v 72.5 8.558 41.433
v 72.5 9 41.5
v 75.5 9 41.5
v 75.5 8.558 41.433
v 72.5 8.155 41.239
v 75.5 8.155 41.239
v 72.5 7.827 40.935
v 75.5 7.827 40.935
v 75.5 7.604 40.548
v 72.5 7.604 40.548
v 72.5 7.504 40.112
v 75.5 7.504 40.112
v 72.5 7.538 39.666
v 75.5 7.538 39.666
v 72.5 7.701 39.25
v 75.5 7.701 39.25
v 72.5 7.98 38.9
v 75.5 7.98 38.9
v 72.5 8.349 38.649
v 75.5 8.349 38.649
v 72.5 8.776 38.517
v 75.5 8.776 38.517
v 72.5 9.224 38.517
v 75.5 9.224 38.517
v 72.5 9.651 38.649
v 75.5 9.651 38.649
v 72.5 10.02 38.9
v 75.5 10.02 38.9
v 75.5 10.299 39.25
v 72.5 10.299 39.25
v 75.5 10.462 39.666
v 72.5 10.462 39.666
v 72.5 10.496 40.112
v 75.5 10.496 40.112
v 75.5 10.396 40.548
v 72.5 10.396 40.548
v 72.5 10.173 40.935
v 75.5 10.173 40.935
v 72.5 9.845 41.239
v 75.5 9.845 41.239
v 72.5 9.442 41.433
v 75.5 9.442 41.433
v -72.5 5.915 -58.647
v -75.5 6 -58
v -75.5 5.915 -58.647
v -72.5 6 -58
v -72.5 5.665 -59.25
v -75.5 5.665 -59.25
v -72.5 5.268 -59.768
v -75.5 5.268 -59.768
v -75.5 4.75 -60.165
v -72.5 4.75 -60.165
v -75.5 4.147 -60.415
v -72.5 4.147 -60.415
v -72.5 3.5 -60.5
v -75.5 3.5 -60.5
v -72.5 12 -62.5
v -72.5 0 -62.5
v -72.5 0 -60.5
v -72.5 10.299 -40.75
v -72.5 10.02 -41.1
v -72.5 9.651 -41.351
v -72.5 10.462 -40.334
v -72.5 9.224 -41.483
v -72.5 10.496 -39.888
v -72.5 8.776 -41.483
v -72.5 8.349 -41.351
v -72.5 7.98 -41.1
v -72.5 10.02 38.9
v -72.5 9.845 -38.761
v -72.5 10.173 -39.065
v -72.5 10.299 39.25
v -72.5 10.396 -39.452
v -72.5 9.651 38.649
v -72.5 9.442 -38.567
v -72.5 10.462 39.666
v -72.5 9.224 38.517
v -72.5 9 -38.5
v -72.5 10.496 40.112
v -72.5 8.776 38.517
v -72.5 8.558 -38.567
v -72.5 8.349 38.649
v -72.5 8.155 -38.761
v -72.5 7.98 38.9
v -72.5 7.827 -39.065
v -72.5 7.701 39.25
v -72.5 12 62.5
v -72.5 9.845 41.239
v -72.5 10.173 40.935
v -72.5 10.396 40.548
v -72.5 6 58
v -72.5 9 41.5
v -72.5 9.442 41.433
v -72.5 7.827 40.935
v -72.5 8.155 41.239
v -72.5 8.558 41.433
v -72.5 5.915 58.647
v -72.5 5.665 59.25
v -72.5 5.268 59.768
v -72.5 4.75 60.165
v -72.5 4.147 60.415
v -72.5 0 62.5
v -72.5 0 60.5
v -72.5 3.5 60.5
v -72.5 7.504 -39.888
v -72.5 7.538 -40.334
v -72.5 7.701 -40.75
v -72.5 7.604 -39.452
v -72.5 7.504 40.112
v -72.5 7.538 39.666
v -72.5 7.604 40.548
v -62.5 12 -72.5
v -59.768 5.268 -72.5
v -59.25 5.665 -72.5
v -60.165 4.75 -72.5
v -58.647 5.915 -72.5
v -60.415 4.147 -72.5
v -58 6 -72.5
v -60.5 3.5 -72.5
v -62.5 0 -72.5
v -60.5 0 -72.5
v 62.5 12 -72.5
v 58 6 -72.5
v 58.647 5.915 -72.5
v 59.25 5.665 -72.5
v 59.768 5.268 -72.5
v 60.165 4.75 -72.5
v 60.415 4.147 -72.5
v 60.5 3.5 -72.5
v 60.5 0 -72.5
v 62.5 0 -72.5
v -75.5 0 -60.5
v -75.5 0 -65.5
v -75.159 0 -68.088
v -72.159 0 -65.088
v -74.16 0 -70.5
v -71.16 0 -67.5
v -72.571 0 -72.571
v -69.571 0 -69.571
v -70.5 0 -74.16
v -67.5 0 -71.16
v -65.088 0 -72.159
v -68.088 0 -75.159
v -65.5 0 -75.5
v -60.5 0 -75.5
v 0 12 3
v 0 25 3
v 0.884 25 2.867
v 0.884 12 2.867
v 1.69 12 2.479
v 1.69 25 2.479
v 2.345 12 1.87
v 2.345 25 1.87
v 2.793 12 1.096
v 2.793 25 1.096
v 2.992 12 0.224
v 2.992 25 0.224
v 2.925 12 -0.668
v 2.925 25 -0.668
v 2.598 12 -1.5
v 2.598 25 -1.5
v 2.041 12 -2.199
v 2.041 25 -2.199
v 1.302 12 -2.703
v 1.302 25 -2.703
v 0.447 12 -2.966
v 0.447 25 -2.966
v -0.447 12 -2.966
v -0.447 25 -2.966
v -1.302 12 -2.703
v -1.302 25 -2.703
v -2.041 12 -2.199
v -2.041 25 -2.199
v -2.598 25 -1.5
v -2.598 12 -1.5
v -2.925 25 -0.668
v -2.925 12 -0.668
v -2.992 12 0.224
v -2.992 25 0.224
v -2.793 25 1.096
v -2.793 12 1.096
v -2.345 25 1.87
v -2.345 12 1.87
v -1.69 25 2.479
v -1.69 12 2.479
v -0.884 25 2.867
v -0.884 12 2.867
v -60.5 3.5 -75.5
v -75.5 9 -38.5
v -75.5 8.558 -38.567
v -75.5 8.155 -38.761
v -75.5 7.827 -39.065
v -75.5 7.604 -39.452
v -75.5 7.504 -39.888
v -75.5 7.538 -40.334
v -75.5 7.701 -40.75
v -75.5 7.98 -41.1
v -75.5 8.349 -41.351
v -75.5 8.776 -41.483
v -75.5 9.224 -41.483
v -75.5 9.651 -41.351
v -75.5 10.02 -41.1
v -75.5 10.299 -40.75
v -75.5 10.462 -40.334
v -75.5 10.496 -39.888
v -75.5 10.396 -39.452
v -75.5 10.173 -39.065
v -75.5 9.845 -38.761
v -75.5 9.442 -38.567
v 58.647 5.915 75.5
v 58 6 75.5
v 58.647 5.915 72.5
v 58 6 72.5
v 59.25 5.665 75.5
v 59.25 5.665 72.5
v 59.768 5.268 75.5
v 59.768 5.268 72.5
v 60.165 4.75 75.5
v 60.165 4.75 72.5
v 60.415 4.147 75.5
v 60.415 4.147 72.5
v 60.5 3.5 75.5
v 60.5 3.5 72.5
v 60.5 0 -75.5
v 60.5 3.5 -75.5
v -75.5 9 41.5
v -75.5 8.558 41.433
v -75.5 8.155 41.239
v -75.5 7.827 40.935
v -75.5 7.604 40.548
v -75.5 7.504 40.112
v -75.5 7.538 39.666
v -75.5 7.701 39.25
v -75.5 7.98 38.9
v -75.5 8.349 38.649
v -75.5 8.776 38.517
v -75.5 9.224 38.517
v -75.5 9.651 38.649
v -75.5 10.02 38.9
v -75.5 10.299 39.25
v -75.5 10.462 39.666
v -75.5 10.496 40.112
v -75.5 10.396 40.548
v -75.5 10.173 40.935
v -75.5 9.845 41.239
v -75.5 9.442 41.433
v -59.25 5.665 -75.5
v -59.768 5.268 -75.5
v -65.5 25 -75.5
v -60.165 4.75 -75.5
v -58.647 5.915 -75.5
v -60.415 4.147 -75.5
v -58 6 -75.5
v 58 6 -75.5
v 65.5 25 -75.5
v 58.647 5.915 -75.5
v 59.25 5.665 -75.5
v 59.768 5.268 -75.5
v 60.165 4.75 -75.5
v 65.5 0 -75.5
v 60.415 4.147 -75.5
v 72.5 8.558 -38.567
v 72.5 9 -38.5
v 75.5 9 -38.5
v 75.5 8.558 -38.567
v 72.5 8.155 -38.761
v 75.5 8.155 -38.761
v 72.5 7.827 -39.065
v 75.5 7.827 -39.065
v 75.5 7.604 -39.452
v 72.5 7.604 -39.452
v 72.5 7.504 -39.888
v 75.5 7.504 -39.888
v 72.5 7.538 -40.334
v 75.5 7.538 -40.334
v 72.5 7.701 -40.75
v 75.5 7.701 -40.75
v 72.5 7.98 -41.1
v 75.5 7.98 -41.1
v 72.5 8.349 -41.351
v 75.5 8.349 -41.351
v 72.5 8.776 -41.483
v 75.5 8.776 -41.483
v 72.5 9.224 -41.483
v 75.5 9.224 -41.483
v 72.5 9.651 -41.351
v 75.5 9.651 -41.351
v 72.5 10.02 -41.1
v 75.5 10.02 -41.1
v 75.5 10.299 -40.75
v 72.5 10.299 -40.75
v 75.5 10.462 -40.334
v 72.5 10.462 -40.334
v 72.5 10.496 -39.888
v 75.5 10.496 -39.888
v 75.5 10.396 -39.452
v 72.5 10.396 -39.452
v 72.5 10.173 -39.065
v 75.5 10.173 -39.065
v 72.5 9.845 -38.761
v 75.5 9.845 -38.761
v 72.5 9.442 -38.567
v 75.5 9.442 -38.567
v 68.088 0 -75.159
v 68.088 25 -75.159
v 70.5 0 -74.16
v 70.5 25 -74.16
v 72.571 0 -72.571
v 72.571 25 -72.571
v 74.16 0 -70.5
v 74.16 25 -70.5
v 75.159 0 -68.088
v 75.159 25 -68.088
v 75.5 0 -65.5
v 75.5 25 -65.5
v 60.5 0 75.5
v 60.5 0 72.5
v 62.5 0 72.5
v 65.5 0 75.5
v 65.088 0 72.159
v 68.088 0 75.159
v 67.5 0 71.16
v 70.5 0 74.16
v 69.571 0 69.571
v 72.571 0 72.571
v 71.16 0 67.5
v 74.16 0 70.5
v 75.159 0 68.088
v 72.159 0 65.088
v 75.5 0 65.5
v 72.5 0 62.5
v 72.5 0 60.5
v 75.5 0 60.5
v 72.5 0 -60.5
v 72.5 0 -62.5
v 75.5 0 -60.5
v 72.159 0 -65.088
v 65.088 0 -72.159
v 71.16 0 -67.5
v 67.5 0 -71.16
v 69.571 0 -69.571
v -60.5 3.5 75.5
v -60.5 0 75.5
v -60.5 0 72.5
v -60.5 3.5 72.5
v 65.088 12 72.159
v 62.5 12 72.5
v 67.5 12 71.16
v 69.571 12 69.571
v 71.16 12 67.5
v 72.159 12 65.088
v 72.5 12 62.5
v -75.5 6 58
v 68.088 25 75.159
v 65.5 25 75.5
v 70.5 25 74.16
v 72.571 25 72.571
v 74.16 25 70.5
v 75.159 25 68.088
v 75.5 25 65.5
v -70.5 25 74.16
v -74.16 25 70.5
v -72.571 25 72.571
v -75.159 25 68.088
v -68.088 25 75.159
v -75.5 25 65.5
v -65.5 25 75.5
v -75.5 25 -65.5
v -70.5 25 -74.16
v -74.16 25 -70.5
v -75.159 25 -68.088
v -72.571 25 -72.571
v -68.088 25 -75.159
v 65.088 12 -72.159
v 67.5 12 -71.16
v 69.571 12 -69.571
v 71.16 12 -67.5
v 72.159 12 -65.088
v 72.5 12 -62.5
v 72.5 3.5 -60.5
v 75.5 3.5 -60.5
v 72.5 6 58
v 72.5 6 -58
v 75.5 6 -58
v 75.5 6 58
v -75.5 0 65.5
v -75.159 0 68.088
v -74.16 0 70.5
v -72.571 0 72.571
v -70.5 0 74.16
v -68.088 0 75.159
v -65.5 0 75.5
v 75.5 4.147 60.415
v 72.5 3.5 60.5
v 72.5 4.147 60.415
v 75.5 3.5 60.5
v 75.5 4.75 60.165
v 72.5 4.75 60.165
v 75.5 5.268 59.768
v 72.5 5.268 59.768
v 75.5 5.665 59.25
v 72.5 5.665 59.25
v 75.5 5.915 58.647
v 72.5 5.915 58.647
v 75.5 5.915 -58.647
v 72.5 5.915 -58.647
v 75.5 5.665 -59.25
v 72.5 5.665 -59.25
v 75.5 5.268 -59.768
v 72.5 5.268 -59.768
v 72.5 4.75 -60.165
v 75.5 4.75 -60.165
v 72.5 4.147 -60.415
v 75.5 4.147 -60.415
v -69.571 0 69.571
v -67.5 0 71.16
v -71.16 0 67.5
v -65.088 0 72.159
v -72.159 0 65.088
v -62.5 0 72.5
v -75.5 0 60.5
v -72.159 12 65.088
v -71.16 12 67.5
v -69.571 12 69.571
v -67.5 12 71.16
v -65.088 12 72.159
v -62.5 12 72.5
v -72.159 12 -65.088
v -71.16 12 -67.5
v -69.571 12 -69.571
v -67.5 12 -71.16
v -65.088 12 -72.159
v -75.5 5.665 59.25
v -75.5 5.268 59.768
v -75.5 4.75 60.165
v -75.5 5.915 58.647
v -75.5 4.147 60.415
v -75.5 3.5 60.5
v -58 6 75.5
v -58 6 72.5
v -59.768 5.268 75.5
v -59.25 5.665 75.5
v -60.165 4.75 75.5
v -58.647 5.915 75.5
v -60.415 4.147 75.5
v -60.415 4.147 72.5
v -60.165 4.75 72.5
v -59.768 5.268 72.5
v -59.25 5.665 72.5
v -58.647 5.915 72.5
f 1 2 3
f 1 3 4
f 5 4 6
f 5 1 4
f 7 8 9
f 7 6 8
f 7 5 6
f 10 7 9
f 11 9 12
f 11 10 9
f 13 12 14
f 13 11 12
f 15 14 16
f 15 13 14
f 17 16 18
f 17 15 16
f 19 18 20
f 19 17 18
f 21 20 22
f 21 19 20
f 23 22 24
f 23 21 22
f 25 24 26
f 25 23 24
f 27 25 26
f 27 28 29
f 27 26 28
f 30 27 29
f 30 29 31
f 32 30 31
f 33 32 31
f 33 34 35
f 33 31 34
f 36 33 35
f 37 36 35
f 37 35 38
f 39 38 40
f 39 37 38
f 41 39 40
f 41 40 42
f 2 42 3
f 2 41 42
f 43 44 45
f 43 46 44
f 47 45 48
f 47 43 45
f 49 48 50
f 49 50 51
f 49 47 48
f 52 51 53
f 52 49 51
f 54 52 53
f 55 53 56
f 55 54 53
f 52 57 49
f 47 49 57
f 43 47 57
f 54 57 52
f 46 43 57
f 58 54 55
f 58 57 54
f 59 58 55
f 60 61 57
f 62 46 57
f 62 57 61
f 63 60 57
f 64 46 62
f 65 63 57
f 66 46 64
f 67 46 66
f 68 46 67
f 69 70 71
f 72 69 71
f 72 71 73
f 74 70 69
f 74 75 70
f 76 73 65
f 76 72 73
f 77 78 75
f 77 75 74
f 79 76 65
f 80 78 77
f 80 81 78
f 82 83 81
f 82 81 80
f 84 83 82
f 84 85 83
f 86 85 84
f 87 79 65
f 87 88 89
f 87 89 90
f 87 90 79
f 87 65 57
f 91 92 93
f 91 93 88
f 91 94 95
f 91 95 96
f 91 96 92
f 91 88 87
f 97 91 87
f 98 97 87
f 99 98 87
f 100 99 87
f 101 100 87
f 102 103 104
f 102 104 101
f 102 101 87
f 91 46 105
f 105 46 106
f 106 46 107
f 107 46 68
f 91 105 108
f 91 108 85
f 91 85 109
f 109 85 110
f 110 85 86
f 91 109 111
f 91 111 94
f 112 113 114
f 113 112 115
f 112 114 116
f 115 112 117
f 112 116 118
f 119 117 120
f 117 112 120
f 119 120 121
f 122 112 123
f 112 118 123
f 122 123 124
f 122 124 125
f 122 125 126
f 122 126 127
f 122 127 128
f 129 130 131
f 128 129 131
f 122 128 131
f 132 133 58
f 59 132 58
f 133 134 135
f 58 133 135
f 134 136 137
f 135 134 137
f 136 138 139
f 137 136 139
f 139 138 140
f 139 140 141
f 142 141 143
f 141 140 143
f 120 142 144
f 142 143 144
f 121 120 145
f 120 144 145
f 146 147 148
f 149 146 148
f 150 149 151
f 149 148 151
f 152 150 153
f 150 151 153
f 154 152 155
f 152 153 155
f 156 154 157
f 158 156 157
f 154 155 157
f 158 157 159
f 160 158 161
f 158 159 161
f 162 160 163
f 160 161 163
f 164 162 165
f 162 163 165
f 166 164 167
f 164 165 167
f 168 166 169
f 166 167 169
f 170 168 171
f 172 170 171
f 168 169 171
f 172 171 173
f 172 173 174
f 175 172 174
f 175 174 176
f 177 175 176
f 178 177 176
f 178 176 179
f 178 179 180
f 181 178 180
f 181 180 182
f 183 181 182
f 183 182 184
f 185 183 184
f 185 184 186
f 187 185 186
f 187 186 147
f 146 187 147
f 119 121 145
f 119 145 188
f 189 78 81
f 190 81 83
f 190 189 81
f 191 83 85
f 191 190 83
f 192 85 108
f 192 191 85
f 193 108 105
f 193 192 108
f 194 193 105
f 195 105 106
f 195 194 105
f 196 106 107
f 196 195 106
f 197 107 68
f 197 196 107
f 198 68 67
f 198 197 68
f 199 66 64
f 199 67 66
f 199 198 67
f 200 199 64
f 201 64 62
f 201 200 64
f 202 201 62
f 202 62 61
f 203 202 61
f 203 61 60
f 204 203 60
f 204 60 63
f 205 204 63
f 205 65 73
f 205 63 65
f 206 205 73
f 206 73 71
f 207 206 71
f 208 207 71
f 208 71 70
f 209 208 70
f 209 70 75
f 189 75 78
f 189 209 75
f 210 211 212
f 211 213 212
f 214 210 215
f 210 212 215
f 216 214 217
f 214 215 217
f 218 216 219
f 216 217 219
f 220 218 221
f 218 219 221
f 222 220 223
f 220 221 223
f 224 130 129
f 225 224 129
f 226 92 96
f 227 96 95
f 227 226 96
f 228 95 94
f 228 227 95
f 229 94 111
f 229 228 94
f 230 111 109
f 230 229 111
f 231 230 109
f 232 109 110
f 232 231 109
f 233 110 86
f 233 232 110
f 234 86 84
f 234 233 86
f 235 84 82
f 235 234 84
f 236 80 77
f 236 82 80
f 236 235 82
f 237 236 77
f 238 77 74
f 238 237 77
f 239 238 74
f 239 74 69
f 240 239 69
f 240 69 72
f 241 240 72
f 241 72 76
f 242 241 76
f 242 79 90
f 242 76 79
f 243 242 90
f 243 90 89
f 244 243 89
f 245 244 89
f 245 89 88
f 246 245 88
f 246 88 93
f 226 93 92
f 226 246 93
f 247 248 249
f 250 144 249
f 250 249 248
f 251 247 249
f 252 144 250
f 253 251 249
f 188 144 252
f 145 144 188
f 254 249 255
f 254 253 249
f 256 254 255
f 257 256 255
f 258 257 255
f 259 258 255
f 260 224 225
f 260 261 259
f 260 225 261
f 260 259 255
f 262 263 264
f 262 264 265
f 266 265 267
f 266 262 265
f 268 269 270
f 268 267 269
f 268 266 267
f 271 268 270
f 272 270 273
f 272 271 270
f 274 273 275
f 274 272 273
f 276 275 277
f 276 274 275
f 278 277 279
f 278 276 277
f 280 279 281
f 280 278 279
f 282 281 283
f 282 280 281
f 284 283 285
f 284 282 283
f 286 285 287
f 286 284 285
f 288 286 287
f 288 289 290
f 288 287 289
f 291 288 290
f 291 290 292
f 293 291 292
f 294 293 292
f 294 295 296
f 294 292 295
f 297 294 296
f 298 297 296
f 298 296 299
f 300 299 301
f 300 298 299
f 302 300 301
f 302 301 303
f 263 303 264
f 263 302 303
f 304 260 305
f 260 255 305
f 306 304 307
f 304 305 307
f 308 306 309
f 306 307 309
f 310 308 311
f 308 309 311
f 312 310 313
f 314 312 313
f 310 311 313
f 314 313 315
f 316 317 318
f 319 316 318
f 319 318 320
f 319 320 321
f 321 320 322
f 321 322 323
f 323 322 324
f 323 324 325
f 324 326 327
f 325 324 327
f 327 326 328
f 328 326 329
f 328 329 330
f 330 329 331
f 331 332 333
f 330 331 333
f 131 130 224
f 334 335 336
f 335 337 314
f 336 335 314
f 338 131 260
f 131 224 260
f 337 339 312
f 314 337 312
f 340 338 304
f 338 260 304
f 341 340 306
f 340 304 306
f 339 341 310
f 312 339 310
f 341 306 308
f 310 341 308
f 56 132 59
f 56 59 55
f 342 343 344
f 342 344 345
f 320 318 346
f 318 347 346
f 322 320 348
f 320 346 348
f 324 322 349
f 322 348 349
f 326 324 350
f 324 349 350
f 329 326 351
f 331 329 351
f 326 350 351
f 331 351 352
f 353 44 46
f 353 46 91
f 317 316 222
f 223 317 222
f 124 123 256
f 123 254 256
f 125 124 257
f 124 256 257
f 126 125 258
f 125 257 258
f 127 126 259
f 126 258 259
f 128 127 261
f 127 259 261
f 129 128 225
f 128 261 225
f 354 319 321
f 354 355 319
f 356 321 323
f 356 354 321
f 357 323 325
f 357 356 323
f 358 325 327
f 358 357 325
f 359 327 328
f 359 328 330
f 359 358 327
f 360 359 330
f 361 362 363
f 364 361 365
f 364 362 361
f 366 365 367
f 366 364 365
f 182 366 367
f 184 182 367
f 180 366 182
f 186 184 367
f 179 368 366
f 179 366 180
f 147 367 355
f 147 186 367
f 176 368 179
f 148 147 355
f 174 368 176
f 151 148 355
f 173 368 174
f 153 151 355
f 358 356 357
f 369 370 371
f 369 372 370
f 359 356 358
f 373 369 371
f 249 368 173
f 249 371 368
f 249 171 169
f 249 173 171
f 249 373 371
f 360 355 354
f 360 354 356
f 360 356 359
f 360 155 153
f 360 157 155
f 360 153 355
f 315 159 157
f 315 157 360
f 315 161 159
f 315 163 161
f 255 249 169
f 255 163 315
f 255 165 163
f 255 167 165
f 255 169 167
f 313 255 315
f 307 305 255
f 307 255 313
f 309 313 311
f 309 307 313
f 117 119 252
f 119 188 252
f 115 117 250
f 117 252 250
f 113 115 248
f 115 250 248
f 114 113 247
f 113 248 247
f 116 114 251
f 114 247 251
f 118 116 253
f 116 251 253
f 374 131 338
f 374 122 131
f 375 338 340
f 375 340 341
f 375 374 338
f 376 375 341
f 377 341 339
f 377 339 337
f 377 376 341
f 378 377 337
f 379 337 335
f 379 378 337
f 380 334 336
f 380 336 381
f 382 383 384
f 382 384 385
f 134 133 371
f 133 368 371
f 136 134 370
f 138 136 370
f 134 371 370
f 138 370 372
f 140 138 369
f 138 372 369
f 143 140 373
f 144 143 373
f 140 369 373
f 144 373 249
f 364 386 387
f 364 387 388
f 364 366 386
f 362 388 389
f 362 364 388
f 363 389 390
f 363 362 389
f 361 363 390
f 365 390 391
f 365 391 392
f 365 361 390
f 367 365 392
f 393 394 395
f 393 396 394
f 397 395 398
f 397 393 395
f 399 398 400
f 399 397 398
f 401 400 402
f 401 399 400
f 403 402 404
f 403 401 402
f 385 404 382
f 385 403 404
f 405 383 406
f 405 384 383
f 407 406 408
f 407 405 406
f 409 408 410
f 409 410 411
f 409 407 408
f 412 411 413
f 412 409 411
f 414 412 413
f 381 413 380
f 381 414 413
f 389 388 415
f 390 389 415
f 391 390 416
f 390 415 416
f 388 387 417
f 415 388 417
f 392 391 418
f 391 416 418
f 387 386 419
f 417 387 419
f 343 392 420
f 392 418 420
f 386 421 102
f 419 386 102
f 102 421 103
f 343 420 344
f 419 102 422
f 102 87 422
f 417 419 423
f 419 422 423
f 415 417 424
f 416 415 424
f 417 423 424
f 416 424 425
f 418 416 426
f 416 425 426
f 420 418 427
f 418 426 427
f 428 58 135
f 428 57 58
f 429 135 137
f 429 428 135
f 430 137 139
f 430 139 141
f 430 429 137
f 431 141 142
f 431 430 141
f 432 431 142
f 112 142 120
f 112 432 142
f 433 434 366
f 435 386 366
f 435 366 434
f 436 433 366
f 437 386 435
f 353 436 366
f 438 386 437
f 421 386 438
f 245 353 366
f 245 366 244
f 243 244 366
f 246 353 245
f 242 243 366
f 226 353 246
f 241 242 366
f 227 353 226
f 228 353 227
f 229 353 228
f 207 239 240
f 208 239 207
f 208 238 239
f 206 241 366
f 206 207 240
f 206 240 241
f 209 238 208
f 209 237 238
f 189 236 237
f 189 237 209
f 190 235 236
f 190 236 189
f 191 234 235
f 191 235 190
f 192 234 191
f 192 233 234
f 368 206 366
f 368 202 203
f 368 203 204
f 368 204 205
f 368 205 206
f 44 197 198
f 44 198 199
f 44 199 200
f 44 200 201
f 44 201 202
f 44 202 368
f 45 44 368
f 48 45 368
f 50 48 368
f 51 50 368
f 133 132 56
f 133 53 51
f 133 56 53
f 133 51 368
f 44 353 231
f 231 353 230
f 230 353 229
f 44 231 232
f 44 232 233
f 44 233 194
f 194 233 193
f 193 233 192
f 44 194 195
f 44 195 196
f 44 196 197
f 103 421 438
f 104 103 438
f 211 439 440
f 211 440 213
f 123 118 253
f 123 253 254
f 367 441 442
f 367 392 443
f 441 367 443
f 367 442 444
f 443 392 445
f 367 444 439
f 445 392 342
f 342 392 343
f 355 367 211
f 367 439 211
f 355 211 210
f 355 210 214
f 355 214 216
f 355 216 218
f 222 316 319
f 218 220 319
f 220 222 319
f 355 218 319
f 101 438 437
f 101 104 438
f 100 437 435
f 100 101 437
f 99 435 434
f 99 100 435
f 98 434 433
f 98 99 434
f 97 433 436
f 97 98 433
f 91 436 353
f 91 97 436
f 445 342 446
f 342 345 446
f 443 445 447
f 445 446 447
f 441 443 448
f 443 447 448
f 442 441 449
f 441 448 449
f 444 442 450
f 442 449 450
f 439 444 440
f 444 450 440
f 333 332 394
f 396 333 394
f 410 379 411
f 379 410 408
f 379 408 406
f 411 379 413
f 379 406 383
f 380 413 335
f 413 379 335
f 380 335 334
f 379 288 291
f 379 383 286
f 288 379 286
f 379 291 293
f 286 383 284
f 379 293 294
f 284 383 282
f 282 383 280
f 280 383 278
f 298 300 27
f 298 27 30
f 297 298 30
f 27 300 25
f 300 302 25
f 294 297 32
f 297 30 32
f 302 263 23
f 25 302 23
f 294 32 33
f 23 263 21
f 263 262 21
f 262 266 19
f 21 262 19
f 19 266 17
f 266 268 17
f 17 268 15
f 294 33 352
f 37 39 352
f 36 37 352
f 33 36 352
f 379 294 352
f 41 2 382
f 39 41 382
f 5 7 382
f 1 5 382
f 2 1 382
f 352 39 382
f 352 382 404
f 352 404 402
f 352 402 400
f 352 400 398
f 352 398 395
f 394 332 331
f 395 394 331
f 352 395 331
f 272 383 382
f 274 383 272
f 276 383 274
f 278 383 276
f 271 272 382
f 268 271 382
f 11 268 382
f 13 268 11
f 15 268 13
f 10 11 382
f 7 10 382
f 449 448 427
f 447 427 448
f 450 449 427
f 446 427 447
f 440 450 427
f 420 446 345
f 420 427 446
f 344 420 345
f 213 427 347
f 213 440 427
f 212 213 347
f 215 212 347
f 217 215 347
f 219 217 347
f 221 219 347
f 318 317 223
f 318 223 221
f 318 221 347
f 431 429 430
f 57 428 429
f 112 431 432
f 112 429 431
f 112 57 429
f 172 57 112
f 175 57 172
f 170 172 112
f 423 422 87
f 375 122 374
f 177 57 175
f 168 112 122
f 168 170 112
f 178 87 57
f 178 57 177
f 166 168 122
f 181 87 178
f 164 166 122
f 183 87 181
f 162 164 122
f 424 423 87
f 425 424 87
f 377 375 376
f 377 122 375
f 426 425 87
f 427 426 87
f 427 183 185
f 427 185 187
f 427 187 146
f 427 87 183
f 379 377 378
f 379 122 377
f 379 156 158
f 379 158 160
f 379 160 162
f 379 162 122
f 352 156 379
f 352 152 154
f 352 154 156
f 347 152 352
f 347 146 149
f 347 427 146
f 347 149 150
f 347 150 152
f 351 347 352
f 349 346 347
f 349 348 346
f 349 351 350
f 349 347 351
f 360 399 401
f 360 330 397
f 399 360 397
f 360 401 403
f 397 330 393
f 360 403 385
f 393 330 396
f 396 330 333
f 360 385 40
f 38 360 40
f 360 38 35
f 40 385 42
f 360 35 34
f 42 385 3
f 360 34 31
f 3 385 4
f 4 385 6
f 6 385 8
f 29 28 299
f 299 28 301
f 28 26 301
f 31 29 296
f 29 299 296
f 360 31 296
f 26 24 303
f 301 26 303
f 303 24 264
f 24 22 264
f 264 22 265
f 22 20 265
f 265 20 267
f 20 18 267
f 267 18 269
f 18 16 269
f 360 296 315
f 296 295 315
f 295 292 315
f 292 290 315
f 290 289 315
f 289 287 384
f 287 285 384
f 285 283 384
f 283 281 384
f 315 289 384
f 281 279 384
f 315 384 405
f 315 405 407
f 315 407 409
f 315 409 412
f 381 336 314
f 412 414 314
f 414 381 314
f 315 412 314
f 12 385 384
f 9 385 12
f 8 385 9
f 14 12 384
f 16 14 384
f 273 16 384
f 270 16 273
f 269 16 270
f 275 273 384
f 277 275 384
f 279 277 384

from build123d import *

# Parameters (mm, degrees)
SKETCH1_W           = 151
SKETCH1_H           = 151
BOSS_EXTRUDE1_DEPTH = 25
SKETCH2_W           = 145
SKETCH2_H           = 145
CUT_EXTRUDE1_DEPTH  = 12
SKETCH3_W           = 121
SKETCH3_H           = 6
CUT_EXTRUDE2_DEPTH  = 171.664143862
SKETCH4_W           = 121
SKETCH4_H           = 6
CUT_EXTRUDE3_DEPTH  = 171.664143862
FILLET1_R           = 10
SKETCH5_R           = 3
CUT_EXTRUDE4_DEPTH  = 110.660840777
FILLET4_R           = 2.5
SKETCH6_R           = 1.5
CUT_EXTRUDE5_DEPTH  = 171.664143862


with BuildPart() as part:
    # Sketch1 → Boss-Extrude1 (new body)
    with BuildSketch(Plane(origin=(0, 0, 0), x_dir=(1, 0, 0), z_dir=(0, 1, 0))):
        Rectangle(SKETCH1_W, SKETCH1_H)
    extrude(amount=BOSS_EXTRUDE1_DEPTH)

    # Sketch2 → Cut-Extrude1 (cut)
    with BuildSketch(Plane.XZ):
        Rectangle(SKETCH2_W, SKETCH2_H)
    extrude(amount=-CUT_EXTRUDE1_DEPTH, mode=Mode.SUBTRACT)

    # Sketch3 → Cut-Extrude2 (cut, through all)
    with BuildSketch(Plane.XY.offset(75.5)):
        with Locations((0, 3)):
            Rectangle(SKETCH3_W, SKETCH3_H)
    extrude(amount=-CUT_EXTRUDE2_DEPTH, mode=Mode.SUBTRACT)

    # Sketch4 → Cut-Extrude3 (cut, through all)
    with BuildSketch(Plane.ZY.offset(75.5)):
        with Locations((0, 3)):
            Rectangle(SKETCH4_W, SKETCH4_H)
    extrude(amount=-CUT_EXTRUDE3_DEPTH, mode=Mode.SUBTRACT)

    # Fillet1
    fillet1_edges = [part.edges().sort_by_distance(p)[0] for p in [
        (72.5, 6, 72.5),
        (72.5, 6, -72.5),
        (-72.5, 6, -72.5),
        (-72.5, 6, 72.5),
        (75.5, 12.5, 75.5),
        (-75.5, 12.5, 75.5),
        (-75.5, 12.5, -75.5),
        (75.5, 12.5, -75.5),
    ]]
    fillet(fillet1_edges, radius=FILLET1_R)

    # Sketch5 → Cut-Extrude4 (cut, through all)
    with BuildSketch(Plane(origin=(0, 25, 0), x_dir=(1, 0, 0), z_dir=(0, 1, 0))):
        with Locations(Location((0, 0, 0), (0, 0, 270))):
            Circle(SKETCH5_R)
    extrude(amount=-CUT_EXTRUDE4_DEPTH, mode=Mode.SUBTRACT)

    # Fillet4
    fillet4_edges = [part.edges().sort_by_distance(p)[0] for p in [
        (-60.5, 6, -74),
        (-60.5, 6, 74),
        (60.5, 6, -74),
        (60.5, 6, 74),
        (74, 6, -60.5),
        (-74, 6, -60.5),
        (74, 6, 60.5),
        (-74, 6, 60.5),
    ]]
    fillet(fillet4_edges, radius=FILLET4_R)

    # Sketch6 → Cut-Extrude5 (cut, through all)
    with BuildSketch(Plane(origin=(-75.5, 0, 0), x_dir=(0, 0, -1), z_dir=(1, 0, 0))):
        with Locations(Location((-40, 9, 0), (0, 0, 180))):
            Circle(SKETCH6_R)
        with Locations(Location((40, 9, 0), (0, 0, 180))):
            Circle(SKETCH6_R)
    extrude(amount=CUT_EXTRUDE5_DEPTH, mode=Mode.SUBTRACT)


solid = part.part
